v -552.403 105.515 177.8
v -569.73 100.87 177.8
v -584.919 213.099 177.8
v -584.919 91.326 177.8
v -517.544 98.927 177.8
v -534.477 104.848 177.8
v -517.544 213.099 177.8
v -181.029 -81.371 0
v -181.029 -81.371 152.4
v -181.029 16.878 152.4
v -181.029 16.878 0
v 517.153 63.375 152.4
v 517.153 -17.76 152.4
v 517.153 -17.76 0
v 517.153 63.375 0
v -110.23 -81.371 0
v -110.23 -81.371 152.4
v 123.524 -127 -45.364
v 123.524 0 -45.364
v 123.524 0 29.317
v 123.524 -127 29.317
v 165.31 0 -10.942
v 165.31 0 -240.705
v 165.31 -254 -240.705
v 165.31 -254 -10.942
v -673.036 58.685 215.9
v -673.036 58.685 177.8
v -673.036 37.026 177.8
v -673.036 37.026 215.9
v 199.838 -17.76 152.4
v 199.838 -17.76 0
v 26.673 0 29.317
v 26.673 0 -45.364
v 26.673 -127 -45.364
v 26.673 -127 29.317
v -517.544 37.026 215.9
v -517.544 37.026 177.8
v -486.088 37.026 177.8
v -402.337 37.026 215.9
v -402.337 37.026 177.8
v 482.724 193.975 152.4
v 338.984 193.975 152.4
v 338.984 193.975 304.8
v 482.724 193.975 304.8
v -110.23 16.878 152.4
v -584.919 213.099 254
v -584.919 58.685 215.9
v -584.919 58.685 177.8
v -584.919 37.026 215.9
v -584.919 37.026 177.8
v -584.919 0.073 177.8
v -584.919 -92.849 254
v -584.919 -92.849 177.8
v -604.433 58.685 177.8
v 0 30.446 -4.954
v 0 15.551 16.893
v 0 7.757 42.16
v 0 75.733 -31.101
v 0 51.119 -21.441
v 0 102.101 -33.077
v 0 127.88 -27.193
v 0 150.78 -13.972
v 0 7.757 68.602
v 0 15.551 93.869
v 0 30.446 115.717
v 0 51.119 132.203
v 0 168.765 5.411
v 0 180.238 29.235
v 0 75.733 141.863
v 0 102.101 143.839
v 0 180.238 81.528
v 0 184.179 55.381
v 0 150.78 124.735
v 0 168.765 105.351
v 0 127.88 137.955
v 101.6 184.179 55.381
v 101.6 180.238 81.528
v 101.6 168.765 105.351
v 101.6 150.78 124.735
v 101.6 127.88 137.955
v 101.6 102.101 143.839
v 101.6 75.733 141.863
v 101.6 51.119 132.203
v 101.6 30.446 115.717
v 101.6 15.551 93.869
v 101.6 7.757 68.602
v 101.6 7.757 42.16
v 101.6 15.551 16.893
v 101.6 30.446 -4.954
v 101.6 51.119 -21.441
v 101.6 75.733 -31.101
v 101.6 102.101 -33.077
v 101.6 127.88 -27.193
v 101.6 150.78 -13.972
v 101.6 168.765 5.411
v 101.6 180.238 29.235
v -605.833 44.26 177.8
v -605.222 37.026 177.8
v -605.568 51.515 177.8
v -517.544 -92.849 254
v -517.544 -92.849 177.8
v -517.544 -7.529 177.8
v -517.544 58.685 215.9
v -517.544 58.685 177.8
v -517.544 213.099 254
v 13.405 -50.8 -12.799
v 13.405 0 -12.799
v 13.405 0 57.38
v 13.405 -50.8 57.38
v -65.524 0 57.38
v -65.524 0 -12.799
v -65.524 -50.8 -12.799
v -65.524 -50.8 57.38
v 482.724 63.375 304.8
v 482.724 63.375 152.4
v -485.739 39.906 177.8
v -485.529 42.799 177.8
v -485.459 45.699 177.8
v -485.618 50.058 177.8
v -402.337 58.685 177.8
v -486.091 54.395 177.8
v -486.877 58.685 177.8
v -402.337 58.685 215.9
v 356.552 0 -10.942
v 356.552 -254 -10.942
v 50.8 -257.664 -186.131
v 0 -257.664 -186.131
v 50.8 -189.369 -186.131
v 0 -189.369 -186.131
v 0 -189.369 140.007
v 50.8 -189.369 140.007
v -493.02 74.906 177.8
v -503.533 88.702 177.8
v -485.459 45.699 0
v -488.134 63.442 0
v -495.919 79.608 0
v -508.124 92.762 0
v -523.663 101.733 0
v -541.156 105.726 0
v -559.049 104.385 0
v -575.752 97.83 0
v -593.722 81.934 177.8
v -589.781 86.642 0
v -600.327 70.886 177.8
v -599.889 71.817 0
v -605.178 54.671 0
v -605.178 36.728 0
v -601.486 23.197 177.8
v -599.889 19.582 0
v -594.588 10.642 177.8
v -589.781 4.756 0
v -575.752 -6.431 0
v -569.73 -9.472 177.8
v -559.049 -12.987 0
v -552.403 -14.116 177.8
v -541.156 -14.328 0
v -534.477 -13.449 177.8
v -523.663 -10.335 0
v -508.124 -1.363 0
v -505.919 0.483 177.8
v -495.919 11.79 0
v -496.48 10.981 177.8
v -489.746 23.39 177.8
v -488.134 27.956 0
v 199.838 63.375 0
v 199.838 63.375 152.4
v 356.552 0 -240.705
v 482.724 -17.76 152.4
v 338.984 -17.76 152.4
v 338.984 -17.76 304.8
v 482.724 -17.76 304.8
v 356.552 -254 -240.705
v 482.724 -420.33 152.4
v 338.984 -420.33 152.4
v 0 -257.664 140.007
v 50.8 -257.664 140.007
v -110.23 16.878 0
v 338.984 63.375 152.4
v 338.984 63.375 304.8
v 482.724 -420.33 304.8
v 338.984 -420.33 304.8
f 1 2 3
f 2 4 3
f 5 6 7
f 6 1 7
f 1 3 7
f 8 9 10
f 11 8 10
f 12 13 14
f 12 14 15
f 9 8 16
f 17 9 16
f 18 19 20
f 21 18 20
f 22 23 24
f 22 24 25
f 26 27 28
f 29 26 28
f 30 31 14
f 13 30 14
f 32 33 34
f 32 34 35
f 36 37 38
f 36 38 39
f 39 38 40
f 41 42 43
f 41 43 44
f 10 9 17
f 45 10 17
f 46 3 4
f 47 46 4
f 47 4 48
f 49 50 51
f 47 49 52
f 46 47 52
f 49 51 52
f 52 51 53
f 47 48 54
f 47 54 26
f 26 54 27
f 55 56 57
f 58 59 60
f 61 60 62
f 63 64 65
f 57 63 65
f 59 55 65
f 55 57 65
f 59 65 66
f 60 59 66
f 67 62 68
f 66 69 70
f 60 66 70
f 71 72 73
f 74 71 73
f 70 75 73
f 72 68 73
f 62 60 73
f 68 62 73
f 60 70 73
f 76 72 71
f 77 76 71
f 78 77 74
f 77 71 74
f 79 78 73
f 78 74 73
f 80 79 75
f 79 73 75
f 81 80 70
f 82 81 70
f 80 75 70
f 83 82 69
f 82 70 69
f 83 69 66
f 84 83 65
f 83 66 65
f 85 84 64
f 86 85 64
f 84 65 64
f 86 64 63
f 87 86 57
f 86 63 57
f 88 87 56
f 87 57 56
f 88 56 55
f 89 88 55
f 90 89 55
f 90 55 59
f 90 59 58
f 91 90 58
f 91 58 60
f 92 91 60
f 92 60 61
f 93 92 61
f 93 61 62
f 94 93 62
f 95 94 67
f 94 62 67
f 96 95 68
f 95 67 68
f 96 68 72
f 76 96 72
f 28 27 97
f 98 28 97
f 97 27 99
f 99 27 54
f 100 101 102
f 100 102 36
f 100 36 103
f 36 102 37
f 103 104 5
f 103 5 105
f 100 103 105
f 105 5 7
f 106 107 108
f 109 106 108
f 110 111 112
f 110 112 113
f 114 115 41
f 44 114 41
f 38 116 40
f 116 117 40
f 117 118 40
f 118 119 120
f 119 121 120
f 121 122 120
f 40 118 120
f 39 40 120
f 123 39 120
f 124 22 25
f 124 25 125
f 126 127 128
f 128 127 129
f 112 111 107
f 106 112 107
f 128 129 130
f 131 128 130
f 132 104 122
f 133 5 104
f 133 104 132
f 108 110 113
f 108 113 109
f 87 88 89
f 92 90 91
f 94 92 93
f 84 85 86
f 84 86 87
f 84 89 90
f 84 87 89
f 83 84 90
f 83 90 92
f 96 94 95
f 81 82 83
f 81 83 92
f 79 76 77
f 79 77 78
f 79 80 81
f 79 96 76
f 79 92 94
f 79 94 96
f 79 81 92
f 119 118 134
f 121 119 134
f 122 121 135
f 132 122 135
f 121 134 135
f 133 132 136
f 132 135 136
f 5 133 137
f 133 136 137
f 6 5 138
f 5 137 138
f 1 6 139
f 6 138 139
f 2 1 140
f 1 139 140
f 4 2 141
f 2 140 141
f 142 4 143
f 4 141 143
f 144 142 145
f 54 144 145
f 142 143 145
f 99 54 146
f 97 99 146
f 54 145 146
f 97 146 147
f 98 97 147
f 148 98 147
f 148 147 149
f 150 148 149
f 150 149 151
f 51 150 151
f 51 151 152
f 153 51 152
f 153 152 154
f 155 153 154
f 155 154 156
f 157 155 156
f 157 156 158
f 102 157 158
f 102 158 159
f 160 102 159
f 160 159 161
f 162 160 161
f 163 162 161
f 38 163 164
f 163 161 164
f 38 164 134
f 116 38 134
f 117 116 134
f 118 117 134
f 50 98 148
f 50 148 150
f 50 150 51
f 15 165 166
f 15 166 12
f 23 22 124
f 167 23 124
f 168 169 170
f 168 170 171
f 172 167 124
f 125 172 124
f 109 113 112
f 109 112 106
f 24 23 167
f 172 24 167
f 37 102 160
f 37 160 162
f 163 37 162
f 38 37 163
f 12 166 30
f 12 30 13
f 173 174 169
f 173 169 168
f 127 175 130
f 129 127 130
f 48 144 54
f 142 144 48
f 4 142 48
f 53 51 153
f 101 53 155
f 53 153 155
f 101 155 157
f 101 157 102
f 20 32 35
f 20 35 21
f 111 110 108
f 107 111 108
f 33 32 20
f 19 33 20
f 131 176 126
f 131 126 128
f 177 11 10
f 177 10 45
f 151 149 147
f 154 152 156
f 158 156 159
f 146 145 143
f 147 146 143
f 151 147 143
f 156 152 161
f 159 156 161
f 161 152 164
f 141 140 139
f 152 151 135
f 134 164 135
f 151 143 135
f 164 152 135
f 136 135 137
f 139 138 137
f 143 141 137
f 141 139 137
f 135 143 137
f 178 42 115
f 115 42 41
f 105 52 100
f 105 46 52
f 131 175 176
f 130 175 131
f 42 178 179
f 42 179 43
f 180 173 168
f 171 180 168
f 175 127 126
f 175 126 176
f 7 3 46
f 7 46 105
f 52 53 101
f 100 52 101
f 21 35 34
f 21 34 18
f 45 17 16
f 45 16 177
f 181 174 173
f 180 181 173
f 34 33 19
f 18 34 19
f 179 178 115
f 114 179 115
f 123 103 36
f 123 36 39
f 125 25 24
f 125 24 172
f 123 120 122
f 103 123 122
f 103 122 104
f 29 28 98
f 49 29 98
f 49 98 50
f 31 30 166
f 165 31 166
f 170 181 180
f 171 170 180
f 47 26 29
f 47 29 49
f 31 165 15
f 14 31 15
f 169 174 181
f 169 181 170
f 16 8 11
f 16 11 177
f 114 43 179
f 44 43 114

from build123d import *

# Parameters (mm, degrees)
F0_W      = 78.9292352274
F0_H      = 70.1791113243
F1_DEPTH  = 50.8
F2_W      = 96.850451082
F2_H      = 74.6815614402
F3_DEPTH  = 127
F4_W      = 70.7993283868
F4_H      = 98.2494205236
F5_DEPTH  = 152.4
F6_W      = 68.2949870825
F6_H      = 326.1379003525
F7_DEPTH  = 50.8
F8_R      = 88.7062581377
F9_DEPTH  = 101.6
F10_W     = 317.314684391
F10_H     = 81.1350904405
F11_DEPTH = 152.4
F12_W     = 191.2417113781
F12_H     = 229.7623949125
F13_DEPTH = 254
F14_R     = 60.1952157033
F15_DEPTH = 177.8
F17_DEPTH = 38.1
F18_W     = 67.3751235008
F18_H     = 176.0733984411
F19_DEPTH = 76.2
F20_W     = 143.7404751778
F20_H     = 130.599565804
F21_DEPTH = 152.4
F20_H_2   = 402.5698415935


# Not quite as in the source:
# - a feature names something its author has since deleted; it is built from what else it names


with BuildPart() as f1:
    # F0 (on Front) → F1 (new body)
    with BuildSketch(Plane.XZ):
        with Locations((-26.0592526756, 22.2907965071)):
            Rectangle(F0_W, F0_H)
    extrude(amount=F1_DEPTH)


with BuildPart() as f3:
    # F2 (on Front) → F3 (new body)
    with BuildSketch(Plane.XZ):
        with Locations((75.0986728817, -8.023692295)):
            Rectangle(F2_W, F2_H)
    extrude(amount=F3_DEPTH)


with BuildPart() as f5:
    # F4 (on Top) → F5 (new body)
    with BuildSketch(Plane.XY):
        with Locations((-145.6297449768, -32.2464182973)):
            Rectangle(F4_W, F4_H)
    extrude(amount=F5_DEPTH)


with BuildPart() as f7:
    # F6 (on Right) → F7 (new body)
    with BuildSketch(Plane.YZ):
        with Locations((-223.5160246491, -23.0616927147)):
            Rectangle(F6_W, F6_H)
    extrude(amount=F7_DEPTH)


with BuildPart() as f9:
    # F8 (on Right) → F9 (new body)
    with BuildSketch(Plane.YZ):
        with Locations((95.4723358154, 55.3811565042)):
            Circle(F8_R)
    extrude(amount=F9_DEPTH)


with BuildPart() as f11:
    # F10 (on Top) → F11 (new body)
    with BuildSketch(Plane.XY):
        with Locations((358.4956228733, 22.8078756481)):
            Rectangle(F10_W, F10_H)
    extrude(amount=F11_DEPTH)


with BuildPart() as f13:
    # F12 (on Front) → F13 (new body)
    with BuildSketch(Plane.XZ):
        with Locations((260.9308212996, -125.8234879933)):
            Rectangle(F12_W, F12_H)
    extrude(amount=F13_DEPTH)


with BuildPart() as f15:
    # F14 (on Top) → F15 (new body)
    with BuildSketch(Plane.XY):
        with Locations((-545.6547141075, 45.6993207335)):
            Circle(F14_R)
    extrude(amount=F15_DEPTH)

    # F16 (on face) → F17 (join)
    with BuildSketch(Plane.XY.offset(177.8)):
        with BuildLine():
            Line((-604.4325111577, 58.6852580309), (-673.0360388756, 58.6852580309))
            Line((-673.0360388756, 58.6852580309), (-673.0360388756, 37.0256043971))
            Line((-673.0360388756, 37.0256043971), (-605.221740544, 37.0256043971))
            ThreePointArc((-605.221740544, 37.0256043971), (-605.810008641, 47.8912452669), (-604.4325111577, 58.6852580309))
        make_face()
        with BuildLine():
            Line((-486.8769170573, 58.6852580309), (-604.4325111577, 58.6852580309))
            ThreePointArc((-604.4325111577, 58.6852580309), (-605.810008641, 47.8912452669), (-605.221740544, 37.0256043971))
            Line((-605.221740544, 37.0256043971), (-486.087687671, 37.0256043971))
            ThreePointArc((-486.087687671, 37.0256043971), (-485.6167511228, 41.3511033735), (-485.4594984042, 45.6993207335))
            ThreePointArc((-485.4594984042, 45.6993207335), (-485.814902253, 52.230852773), (-486.8769170573, 58.6852580309))
        make_face()
        with BuildLine():
            Line((-402.3371636868, 58.6852580309), (-486.8769170573, 58.6852580309))
            ThreePointArc((-486.8769170573, 58.6852580309), (-485.814902253, 52.230852773), (-485.4594984042, 45.6993207335))
            ThreePointArc((-485.4594984042, 45.6993207335), (-485.6167511228, 41.3511033735), (-486.087687671, 37.0256043971))
            Line((-486.087687671, 37.0256043971), (-402.3371636868, 37.0256043971))
            Line((-402.3371636868, 37.0256043971), (-402.3371636868, 58.6852580309))
        make_face()
    extrude(amount=F17_DEPTH)

    # F18 (on face) → F19 (join)
    with BuildSketch(Plane.XY.offset(177.8)):
        with BuildLine():
            Line((-584.9188566208, -92.848777771), (-517.54373312, -92.848777771))
            Line((-517.54373312, -92.848777771), (-517.54373312, -7.5288366785))
            ThreePointArc((-517.54373312, -7.5288366785), (-552.4033425041, -14.1163963342), (-584.9188566208, 0.0726716536))
            Line((-584.9188566208, 0.0726716536), (-584.9188566208, -92.848777771))
        make_face()
        with BuildLine():
            ThreePointArc((-584.9188566208, 0.0726716536), (-552.4033425041, -14.1163963342), (-517.54373312, -7.5288366785))
            Line((-517.54373312, -7.5288366785), (-517.54373312, 37.0256043971))
            Line((-517.54373312, 37.0256043971), (-584.9188566208, 37.0256043971))
            Line((-584.9188566208, 37.0256043971), (-584.9188566208, 0.0726716536))
        make_face()
        with Locations((-551.2312948704, 125.0623036176)):
            Rectangle(F18_W, F18_H)
    extrude(amount=F19_DEPTH)


with BuildPart() as f21:
    # F20 (on face) → F21 (new body)
    with BuildSketch(Plane.XY.offset(152.4)):
        with Locations((410.8542501926, 128.6752037704)):
            Rectangle(F20_W, F20_H)
    extrude(amount=F21_DEPTH)


with BuildPart() as f21b:
    # F20 (on face) → F21, piece 2 (new body)
    with BuildSketch(Plane.XY.offset(152.4)):
        with Locations((410.8542501926, -219.0445903689)):
            Rectangle(F20_W, F20_H_2)
    extrude(amount=F21_DEPTH)


solid = Compound([f1.part, f3.part, f5.part, f7.part, f9.part, f11.part, f13.part, f15.part, f21.part, f21b.part])
